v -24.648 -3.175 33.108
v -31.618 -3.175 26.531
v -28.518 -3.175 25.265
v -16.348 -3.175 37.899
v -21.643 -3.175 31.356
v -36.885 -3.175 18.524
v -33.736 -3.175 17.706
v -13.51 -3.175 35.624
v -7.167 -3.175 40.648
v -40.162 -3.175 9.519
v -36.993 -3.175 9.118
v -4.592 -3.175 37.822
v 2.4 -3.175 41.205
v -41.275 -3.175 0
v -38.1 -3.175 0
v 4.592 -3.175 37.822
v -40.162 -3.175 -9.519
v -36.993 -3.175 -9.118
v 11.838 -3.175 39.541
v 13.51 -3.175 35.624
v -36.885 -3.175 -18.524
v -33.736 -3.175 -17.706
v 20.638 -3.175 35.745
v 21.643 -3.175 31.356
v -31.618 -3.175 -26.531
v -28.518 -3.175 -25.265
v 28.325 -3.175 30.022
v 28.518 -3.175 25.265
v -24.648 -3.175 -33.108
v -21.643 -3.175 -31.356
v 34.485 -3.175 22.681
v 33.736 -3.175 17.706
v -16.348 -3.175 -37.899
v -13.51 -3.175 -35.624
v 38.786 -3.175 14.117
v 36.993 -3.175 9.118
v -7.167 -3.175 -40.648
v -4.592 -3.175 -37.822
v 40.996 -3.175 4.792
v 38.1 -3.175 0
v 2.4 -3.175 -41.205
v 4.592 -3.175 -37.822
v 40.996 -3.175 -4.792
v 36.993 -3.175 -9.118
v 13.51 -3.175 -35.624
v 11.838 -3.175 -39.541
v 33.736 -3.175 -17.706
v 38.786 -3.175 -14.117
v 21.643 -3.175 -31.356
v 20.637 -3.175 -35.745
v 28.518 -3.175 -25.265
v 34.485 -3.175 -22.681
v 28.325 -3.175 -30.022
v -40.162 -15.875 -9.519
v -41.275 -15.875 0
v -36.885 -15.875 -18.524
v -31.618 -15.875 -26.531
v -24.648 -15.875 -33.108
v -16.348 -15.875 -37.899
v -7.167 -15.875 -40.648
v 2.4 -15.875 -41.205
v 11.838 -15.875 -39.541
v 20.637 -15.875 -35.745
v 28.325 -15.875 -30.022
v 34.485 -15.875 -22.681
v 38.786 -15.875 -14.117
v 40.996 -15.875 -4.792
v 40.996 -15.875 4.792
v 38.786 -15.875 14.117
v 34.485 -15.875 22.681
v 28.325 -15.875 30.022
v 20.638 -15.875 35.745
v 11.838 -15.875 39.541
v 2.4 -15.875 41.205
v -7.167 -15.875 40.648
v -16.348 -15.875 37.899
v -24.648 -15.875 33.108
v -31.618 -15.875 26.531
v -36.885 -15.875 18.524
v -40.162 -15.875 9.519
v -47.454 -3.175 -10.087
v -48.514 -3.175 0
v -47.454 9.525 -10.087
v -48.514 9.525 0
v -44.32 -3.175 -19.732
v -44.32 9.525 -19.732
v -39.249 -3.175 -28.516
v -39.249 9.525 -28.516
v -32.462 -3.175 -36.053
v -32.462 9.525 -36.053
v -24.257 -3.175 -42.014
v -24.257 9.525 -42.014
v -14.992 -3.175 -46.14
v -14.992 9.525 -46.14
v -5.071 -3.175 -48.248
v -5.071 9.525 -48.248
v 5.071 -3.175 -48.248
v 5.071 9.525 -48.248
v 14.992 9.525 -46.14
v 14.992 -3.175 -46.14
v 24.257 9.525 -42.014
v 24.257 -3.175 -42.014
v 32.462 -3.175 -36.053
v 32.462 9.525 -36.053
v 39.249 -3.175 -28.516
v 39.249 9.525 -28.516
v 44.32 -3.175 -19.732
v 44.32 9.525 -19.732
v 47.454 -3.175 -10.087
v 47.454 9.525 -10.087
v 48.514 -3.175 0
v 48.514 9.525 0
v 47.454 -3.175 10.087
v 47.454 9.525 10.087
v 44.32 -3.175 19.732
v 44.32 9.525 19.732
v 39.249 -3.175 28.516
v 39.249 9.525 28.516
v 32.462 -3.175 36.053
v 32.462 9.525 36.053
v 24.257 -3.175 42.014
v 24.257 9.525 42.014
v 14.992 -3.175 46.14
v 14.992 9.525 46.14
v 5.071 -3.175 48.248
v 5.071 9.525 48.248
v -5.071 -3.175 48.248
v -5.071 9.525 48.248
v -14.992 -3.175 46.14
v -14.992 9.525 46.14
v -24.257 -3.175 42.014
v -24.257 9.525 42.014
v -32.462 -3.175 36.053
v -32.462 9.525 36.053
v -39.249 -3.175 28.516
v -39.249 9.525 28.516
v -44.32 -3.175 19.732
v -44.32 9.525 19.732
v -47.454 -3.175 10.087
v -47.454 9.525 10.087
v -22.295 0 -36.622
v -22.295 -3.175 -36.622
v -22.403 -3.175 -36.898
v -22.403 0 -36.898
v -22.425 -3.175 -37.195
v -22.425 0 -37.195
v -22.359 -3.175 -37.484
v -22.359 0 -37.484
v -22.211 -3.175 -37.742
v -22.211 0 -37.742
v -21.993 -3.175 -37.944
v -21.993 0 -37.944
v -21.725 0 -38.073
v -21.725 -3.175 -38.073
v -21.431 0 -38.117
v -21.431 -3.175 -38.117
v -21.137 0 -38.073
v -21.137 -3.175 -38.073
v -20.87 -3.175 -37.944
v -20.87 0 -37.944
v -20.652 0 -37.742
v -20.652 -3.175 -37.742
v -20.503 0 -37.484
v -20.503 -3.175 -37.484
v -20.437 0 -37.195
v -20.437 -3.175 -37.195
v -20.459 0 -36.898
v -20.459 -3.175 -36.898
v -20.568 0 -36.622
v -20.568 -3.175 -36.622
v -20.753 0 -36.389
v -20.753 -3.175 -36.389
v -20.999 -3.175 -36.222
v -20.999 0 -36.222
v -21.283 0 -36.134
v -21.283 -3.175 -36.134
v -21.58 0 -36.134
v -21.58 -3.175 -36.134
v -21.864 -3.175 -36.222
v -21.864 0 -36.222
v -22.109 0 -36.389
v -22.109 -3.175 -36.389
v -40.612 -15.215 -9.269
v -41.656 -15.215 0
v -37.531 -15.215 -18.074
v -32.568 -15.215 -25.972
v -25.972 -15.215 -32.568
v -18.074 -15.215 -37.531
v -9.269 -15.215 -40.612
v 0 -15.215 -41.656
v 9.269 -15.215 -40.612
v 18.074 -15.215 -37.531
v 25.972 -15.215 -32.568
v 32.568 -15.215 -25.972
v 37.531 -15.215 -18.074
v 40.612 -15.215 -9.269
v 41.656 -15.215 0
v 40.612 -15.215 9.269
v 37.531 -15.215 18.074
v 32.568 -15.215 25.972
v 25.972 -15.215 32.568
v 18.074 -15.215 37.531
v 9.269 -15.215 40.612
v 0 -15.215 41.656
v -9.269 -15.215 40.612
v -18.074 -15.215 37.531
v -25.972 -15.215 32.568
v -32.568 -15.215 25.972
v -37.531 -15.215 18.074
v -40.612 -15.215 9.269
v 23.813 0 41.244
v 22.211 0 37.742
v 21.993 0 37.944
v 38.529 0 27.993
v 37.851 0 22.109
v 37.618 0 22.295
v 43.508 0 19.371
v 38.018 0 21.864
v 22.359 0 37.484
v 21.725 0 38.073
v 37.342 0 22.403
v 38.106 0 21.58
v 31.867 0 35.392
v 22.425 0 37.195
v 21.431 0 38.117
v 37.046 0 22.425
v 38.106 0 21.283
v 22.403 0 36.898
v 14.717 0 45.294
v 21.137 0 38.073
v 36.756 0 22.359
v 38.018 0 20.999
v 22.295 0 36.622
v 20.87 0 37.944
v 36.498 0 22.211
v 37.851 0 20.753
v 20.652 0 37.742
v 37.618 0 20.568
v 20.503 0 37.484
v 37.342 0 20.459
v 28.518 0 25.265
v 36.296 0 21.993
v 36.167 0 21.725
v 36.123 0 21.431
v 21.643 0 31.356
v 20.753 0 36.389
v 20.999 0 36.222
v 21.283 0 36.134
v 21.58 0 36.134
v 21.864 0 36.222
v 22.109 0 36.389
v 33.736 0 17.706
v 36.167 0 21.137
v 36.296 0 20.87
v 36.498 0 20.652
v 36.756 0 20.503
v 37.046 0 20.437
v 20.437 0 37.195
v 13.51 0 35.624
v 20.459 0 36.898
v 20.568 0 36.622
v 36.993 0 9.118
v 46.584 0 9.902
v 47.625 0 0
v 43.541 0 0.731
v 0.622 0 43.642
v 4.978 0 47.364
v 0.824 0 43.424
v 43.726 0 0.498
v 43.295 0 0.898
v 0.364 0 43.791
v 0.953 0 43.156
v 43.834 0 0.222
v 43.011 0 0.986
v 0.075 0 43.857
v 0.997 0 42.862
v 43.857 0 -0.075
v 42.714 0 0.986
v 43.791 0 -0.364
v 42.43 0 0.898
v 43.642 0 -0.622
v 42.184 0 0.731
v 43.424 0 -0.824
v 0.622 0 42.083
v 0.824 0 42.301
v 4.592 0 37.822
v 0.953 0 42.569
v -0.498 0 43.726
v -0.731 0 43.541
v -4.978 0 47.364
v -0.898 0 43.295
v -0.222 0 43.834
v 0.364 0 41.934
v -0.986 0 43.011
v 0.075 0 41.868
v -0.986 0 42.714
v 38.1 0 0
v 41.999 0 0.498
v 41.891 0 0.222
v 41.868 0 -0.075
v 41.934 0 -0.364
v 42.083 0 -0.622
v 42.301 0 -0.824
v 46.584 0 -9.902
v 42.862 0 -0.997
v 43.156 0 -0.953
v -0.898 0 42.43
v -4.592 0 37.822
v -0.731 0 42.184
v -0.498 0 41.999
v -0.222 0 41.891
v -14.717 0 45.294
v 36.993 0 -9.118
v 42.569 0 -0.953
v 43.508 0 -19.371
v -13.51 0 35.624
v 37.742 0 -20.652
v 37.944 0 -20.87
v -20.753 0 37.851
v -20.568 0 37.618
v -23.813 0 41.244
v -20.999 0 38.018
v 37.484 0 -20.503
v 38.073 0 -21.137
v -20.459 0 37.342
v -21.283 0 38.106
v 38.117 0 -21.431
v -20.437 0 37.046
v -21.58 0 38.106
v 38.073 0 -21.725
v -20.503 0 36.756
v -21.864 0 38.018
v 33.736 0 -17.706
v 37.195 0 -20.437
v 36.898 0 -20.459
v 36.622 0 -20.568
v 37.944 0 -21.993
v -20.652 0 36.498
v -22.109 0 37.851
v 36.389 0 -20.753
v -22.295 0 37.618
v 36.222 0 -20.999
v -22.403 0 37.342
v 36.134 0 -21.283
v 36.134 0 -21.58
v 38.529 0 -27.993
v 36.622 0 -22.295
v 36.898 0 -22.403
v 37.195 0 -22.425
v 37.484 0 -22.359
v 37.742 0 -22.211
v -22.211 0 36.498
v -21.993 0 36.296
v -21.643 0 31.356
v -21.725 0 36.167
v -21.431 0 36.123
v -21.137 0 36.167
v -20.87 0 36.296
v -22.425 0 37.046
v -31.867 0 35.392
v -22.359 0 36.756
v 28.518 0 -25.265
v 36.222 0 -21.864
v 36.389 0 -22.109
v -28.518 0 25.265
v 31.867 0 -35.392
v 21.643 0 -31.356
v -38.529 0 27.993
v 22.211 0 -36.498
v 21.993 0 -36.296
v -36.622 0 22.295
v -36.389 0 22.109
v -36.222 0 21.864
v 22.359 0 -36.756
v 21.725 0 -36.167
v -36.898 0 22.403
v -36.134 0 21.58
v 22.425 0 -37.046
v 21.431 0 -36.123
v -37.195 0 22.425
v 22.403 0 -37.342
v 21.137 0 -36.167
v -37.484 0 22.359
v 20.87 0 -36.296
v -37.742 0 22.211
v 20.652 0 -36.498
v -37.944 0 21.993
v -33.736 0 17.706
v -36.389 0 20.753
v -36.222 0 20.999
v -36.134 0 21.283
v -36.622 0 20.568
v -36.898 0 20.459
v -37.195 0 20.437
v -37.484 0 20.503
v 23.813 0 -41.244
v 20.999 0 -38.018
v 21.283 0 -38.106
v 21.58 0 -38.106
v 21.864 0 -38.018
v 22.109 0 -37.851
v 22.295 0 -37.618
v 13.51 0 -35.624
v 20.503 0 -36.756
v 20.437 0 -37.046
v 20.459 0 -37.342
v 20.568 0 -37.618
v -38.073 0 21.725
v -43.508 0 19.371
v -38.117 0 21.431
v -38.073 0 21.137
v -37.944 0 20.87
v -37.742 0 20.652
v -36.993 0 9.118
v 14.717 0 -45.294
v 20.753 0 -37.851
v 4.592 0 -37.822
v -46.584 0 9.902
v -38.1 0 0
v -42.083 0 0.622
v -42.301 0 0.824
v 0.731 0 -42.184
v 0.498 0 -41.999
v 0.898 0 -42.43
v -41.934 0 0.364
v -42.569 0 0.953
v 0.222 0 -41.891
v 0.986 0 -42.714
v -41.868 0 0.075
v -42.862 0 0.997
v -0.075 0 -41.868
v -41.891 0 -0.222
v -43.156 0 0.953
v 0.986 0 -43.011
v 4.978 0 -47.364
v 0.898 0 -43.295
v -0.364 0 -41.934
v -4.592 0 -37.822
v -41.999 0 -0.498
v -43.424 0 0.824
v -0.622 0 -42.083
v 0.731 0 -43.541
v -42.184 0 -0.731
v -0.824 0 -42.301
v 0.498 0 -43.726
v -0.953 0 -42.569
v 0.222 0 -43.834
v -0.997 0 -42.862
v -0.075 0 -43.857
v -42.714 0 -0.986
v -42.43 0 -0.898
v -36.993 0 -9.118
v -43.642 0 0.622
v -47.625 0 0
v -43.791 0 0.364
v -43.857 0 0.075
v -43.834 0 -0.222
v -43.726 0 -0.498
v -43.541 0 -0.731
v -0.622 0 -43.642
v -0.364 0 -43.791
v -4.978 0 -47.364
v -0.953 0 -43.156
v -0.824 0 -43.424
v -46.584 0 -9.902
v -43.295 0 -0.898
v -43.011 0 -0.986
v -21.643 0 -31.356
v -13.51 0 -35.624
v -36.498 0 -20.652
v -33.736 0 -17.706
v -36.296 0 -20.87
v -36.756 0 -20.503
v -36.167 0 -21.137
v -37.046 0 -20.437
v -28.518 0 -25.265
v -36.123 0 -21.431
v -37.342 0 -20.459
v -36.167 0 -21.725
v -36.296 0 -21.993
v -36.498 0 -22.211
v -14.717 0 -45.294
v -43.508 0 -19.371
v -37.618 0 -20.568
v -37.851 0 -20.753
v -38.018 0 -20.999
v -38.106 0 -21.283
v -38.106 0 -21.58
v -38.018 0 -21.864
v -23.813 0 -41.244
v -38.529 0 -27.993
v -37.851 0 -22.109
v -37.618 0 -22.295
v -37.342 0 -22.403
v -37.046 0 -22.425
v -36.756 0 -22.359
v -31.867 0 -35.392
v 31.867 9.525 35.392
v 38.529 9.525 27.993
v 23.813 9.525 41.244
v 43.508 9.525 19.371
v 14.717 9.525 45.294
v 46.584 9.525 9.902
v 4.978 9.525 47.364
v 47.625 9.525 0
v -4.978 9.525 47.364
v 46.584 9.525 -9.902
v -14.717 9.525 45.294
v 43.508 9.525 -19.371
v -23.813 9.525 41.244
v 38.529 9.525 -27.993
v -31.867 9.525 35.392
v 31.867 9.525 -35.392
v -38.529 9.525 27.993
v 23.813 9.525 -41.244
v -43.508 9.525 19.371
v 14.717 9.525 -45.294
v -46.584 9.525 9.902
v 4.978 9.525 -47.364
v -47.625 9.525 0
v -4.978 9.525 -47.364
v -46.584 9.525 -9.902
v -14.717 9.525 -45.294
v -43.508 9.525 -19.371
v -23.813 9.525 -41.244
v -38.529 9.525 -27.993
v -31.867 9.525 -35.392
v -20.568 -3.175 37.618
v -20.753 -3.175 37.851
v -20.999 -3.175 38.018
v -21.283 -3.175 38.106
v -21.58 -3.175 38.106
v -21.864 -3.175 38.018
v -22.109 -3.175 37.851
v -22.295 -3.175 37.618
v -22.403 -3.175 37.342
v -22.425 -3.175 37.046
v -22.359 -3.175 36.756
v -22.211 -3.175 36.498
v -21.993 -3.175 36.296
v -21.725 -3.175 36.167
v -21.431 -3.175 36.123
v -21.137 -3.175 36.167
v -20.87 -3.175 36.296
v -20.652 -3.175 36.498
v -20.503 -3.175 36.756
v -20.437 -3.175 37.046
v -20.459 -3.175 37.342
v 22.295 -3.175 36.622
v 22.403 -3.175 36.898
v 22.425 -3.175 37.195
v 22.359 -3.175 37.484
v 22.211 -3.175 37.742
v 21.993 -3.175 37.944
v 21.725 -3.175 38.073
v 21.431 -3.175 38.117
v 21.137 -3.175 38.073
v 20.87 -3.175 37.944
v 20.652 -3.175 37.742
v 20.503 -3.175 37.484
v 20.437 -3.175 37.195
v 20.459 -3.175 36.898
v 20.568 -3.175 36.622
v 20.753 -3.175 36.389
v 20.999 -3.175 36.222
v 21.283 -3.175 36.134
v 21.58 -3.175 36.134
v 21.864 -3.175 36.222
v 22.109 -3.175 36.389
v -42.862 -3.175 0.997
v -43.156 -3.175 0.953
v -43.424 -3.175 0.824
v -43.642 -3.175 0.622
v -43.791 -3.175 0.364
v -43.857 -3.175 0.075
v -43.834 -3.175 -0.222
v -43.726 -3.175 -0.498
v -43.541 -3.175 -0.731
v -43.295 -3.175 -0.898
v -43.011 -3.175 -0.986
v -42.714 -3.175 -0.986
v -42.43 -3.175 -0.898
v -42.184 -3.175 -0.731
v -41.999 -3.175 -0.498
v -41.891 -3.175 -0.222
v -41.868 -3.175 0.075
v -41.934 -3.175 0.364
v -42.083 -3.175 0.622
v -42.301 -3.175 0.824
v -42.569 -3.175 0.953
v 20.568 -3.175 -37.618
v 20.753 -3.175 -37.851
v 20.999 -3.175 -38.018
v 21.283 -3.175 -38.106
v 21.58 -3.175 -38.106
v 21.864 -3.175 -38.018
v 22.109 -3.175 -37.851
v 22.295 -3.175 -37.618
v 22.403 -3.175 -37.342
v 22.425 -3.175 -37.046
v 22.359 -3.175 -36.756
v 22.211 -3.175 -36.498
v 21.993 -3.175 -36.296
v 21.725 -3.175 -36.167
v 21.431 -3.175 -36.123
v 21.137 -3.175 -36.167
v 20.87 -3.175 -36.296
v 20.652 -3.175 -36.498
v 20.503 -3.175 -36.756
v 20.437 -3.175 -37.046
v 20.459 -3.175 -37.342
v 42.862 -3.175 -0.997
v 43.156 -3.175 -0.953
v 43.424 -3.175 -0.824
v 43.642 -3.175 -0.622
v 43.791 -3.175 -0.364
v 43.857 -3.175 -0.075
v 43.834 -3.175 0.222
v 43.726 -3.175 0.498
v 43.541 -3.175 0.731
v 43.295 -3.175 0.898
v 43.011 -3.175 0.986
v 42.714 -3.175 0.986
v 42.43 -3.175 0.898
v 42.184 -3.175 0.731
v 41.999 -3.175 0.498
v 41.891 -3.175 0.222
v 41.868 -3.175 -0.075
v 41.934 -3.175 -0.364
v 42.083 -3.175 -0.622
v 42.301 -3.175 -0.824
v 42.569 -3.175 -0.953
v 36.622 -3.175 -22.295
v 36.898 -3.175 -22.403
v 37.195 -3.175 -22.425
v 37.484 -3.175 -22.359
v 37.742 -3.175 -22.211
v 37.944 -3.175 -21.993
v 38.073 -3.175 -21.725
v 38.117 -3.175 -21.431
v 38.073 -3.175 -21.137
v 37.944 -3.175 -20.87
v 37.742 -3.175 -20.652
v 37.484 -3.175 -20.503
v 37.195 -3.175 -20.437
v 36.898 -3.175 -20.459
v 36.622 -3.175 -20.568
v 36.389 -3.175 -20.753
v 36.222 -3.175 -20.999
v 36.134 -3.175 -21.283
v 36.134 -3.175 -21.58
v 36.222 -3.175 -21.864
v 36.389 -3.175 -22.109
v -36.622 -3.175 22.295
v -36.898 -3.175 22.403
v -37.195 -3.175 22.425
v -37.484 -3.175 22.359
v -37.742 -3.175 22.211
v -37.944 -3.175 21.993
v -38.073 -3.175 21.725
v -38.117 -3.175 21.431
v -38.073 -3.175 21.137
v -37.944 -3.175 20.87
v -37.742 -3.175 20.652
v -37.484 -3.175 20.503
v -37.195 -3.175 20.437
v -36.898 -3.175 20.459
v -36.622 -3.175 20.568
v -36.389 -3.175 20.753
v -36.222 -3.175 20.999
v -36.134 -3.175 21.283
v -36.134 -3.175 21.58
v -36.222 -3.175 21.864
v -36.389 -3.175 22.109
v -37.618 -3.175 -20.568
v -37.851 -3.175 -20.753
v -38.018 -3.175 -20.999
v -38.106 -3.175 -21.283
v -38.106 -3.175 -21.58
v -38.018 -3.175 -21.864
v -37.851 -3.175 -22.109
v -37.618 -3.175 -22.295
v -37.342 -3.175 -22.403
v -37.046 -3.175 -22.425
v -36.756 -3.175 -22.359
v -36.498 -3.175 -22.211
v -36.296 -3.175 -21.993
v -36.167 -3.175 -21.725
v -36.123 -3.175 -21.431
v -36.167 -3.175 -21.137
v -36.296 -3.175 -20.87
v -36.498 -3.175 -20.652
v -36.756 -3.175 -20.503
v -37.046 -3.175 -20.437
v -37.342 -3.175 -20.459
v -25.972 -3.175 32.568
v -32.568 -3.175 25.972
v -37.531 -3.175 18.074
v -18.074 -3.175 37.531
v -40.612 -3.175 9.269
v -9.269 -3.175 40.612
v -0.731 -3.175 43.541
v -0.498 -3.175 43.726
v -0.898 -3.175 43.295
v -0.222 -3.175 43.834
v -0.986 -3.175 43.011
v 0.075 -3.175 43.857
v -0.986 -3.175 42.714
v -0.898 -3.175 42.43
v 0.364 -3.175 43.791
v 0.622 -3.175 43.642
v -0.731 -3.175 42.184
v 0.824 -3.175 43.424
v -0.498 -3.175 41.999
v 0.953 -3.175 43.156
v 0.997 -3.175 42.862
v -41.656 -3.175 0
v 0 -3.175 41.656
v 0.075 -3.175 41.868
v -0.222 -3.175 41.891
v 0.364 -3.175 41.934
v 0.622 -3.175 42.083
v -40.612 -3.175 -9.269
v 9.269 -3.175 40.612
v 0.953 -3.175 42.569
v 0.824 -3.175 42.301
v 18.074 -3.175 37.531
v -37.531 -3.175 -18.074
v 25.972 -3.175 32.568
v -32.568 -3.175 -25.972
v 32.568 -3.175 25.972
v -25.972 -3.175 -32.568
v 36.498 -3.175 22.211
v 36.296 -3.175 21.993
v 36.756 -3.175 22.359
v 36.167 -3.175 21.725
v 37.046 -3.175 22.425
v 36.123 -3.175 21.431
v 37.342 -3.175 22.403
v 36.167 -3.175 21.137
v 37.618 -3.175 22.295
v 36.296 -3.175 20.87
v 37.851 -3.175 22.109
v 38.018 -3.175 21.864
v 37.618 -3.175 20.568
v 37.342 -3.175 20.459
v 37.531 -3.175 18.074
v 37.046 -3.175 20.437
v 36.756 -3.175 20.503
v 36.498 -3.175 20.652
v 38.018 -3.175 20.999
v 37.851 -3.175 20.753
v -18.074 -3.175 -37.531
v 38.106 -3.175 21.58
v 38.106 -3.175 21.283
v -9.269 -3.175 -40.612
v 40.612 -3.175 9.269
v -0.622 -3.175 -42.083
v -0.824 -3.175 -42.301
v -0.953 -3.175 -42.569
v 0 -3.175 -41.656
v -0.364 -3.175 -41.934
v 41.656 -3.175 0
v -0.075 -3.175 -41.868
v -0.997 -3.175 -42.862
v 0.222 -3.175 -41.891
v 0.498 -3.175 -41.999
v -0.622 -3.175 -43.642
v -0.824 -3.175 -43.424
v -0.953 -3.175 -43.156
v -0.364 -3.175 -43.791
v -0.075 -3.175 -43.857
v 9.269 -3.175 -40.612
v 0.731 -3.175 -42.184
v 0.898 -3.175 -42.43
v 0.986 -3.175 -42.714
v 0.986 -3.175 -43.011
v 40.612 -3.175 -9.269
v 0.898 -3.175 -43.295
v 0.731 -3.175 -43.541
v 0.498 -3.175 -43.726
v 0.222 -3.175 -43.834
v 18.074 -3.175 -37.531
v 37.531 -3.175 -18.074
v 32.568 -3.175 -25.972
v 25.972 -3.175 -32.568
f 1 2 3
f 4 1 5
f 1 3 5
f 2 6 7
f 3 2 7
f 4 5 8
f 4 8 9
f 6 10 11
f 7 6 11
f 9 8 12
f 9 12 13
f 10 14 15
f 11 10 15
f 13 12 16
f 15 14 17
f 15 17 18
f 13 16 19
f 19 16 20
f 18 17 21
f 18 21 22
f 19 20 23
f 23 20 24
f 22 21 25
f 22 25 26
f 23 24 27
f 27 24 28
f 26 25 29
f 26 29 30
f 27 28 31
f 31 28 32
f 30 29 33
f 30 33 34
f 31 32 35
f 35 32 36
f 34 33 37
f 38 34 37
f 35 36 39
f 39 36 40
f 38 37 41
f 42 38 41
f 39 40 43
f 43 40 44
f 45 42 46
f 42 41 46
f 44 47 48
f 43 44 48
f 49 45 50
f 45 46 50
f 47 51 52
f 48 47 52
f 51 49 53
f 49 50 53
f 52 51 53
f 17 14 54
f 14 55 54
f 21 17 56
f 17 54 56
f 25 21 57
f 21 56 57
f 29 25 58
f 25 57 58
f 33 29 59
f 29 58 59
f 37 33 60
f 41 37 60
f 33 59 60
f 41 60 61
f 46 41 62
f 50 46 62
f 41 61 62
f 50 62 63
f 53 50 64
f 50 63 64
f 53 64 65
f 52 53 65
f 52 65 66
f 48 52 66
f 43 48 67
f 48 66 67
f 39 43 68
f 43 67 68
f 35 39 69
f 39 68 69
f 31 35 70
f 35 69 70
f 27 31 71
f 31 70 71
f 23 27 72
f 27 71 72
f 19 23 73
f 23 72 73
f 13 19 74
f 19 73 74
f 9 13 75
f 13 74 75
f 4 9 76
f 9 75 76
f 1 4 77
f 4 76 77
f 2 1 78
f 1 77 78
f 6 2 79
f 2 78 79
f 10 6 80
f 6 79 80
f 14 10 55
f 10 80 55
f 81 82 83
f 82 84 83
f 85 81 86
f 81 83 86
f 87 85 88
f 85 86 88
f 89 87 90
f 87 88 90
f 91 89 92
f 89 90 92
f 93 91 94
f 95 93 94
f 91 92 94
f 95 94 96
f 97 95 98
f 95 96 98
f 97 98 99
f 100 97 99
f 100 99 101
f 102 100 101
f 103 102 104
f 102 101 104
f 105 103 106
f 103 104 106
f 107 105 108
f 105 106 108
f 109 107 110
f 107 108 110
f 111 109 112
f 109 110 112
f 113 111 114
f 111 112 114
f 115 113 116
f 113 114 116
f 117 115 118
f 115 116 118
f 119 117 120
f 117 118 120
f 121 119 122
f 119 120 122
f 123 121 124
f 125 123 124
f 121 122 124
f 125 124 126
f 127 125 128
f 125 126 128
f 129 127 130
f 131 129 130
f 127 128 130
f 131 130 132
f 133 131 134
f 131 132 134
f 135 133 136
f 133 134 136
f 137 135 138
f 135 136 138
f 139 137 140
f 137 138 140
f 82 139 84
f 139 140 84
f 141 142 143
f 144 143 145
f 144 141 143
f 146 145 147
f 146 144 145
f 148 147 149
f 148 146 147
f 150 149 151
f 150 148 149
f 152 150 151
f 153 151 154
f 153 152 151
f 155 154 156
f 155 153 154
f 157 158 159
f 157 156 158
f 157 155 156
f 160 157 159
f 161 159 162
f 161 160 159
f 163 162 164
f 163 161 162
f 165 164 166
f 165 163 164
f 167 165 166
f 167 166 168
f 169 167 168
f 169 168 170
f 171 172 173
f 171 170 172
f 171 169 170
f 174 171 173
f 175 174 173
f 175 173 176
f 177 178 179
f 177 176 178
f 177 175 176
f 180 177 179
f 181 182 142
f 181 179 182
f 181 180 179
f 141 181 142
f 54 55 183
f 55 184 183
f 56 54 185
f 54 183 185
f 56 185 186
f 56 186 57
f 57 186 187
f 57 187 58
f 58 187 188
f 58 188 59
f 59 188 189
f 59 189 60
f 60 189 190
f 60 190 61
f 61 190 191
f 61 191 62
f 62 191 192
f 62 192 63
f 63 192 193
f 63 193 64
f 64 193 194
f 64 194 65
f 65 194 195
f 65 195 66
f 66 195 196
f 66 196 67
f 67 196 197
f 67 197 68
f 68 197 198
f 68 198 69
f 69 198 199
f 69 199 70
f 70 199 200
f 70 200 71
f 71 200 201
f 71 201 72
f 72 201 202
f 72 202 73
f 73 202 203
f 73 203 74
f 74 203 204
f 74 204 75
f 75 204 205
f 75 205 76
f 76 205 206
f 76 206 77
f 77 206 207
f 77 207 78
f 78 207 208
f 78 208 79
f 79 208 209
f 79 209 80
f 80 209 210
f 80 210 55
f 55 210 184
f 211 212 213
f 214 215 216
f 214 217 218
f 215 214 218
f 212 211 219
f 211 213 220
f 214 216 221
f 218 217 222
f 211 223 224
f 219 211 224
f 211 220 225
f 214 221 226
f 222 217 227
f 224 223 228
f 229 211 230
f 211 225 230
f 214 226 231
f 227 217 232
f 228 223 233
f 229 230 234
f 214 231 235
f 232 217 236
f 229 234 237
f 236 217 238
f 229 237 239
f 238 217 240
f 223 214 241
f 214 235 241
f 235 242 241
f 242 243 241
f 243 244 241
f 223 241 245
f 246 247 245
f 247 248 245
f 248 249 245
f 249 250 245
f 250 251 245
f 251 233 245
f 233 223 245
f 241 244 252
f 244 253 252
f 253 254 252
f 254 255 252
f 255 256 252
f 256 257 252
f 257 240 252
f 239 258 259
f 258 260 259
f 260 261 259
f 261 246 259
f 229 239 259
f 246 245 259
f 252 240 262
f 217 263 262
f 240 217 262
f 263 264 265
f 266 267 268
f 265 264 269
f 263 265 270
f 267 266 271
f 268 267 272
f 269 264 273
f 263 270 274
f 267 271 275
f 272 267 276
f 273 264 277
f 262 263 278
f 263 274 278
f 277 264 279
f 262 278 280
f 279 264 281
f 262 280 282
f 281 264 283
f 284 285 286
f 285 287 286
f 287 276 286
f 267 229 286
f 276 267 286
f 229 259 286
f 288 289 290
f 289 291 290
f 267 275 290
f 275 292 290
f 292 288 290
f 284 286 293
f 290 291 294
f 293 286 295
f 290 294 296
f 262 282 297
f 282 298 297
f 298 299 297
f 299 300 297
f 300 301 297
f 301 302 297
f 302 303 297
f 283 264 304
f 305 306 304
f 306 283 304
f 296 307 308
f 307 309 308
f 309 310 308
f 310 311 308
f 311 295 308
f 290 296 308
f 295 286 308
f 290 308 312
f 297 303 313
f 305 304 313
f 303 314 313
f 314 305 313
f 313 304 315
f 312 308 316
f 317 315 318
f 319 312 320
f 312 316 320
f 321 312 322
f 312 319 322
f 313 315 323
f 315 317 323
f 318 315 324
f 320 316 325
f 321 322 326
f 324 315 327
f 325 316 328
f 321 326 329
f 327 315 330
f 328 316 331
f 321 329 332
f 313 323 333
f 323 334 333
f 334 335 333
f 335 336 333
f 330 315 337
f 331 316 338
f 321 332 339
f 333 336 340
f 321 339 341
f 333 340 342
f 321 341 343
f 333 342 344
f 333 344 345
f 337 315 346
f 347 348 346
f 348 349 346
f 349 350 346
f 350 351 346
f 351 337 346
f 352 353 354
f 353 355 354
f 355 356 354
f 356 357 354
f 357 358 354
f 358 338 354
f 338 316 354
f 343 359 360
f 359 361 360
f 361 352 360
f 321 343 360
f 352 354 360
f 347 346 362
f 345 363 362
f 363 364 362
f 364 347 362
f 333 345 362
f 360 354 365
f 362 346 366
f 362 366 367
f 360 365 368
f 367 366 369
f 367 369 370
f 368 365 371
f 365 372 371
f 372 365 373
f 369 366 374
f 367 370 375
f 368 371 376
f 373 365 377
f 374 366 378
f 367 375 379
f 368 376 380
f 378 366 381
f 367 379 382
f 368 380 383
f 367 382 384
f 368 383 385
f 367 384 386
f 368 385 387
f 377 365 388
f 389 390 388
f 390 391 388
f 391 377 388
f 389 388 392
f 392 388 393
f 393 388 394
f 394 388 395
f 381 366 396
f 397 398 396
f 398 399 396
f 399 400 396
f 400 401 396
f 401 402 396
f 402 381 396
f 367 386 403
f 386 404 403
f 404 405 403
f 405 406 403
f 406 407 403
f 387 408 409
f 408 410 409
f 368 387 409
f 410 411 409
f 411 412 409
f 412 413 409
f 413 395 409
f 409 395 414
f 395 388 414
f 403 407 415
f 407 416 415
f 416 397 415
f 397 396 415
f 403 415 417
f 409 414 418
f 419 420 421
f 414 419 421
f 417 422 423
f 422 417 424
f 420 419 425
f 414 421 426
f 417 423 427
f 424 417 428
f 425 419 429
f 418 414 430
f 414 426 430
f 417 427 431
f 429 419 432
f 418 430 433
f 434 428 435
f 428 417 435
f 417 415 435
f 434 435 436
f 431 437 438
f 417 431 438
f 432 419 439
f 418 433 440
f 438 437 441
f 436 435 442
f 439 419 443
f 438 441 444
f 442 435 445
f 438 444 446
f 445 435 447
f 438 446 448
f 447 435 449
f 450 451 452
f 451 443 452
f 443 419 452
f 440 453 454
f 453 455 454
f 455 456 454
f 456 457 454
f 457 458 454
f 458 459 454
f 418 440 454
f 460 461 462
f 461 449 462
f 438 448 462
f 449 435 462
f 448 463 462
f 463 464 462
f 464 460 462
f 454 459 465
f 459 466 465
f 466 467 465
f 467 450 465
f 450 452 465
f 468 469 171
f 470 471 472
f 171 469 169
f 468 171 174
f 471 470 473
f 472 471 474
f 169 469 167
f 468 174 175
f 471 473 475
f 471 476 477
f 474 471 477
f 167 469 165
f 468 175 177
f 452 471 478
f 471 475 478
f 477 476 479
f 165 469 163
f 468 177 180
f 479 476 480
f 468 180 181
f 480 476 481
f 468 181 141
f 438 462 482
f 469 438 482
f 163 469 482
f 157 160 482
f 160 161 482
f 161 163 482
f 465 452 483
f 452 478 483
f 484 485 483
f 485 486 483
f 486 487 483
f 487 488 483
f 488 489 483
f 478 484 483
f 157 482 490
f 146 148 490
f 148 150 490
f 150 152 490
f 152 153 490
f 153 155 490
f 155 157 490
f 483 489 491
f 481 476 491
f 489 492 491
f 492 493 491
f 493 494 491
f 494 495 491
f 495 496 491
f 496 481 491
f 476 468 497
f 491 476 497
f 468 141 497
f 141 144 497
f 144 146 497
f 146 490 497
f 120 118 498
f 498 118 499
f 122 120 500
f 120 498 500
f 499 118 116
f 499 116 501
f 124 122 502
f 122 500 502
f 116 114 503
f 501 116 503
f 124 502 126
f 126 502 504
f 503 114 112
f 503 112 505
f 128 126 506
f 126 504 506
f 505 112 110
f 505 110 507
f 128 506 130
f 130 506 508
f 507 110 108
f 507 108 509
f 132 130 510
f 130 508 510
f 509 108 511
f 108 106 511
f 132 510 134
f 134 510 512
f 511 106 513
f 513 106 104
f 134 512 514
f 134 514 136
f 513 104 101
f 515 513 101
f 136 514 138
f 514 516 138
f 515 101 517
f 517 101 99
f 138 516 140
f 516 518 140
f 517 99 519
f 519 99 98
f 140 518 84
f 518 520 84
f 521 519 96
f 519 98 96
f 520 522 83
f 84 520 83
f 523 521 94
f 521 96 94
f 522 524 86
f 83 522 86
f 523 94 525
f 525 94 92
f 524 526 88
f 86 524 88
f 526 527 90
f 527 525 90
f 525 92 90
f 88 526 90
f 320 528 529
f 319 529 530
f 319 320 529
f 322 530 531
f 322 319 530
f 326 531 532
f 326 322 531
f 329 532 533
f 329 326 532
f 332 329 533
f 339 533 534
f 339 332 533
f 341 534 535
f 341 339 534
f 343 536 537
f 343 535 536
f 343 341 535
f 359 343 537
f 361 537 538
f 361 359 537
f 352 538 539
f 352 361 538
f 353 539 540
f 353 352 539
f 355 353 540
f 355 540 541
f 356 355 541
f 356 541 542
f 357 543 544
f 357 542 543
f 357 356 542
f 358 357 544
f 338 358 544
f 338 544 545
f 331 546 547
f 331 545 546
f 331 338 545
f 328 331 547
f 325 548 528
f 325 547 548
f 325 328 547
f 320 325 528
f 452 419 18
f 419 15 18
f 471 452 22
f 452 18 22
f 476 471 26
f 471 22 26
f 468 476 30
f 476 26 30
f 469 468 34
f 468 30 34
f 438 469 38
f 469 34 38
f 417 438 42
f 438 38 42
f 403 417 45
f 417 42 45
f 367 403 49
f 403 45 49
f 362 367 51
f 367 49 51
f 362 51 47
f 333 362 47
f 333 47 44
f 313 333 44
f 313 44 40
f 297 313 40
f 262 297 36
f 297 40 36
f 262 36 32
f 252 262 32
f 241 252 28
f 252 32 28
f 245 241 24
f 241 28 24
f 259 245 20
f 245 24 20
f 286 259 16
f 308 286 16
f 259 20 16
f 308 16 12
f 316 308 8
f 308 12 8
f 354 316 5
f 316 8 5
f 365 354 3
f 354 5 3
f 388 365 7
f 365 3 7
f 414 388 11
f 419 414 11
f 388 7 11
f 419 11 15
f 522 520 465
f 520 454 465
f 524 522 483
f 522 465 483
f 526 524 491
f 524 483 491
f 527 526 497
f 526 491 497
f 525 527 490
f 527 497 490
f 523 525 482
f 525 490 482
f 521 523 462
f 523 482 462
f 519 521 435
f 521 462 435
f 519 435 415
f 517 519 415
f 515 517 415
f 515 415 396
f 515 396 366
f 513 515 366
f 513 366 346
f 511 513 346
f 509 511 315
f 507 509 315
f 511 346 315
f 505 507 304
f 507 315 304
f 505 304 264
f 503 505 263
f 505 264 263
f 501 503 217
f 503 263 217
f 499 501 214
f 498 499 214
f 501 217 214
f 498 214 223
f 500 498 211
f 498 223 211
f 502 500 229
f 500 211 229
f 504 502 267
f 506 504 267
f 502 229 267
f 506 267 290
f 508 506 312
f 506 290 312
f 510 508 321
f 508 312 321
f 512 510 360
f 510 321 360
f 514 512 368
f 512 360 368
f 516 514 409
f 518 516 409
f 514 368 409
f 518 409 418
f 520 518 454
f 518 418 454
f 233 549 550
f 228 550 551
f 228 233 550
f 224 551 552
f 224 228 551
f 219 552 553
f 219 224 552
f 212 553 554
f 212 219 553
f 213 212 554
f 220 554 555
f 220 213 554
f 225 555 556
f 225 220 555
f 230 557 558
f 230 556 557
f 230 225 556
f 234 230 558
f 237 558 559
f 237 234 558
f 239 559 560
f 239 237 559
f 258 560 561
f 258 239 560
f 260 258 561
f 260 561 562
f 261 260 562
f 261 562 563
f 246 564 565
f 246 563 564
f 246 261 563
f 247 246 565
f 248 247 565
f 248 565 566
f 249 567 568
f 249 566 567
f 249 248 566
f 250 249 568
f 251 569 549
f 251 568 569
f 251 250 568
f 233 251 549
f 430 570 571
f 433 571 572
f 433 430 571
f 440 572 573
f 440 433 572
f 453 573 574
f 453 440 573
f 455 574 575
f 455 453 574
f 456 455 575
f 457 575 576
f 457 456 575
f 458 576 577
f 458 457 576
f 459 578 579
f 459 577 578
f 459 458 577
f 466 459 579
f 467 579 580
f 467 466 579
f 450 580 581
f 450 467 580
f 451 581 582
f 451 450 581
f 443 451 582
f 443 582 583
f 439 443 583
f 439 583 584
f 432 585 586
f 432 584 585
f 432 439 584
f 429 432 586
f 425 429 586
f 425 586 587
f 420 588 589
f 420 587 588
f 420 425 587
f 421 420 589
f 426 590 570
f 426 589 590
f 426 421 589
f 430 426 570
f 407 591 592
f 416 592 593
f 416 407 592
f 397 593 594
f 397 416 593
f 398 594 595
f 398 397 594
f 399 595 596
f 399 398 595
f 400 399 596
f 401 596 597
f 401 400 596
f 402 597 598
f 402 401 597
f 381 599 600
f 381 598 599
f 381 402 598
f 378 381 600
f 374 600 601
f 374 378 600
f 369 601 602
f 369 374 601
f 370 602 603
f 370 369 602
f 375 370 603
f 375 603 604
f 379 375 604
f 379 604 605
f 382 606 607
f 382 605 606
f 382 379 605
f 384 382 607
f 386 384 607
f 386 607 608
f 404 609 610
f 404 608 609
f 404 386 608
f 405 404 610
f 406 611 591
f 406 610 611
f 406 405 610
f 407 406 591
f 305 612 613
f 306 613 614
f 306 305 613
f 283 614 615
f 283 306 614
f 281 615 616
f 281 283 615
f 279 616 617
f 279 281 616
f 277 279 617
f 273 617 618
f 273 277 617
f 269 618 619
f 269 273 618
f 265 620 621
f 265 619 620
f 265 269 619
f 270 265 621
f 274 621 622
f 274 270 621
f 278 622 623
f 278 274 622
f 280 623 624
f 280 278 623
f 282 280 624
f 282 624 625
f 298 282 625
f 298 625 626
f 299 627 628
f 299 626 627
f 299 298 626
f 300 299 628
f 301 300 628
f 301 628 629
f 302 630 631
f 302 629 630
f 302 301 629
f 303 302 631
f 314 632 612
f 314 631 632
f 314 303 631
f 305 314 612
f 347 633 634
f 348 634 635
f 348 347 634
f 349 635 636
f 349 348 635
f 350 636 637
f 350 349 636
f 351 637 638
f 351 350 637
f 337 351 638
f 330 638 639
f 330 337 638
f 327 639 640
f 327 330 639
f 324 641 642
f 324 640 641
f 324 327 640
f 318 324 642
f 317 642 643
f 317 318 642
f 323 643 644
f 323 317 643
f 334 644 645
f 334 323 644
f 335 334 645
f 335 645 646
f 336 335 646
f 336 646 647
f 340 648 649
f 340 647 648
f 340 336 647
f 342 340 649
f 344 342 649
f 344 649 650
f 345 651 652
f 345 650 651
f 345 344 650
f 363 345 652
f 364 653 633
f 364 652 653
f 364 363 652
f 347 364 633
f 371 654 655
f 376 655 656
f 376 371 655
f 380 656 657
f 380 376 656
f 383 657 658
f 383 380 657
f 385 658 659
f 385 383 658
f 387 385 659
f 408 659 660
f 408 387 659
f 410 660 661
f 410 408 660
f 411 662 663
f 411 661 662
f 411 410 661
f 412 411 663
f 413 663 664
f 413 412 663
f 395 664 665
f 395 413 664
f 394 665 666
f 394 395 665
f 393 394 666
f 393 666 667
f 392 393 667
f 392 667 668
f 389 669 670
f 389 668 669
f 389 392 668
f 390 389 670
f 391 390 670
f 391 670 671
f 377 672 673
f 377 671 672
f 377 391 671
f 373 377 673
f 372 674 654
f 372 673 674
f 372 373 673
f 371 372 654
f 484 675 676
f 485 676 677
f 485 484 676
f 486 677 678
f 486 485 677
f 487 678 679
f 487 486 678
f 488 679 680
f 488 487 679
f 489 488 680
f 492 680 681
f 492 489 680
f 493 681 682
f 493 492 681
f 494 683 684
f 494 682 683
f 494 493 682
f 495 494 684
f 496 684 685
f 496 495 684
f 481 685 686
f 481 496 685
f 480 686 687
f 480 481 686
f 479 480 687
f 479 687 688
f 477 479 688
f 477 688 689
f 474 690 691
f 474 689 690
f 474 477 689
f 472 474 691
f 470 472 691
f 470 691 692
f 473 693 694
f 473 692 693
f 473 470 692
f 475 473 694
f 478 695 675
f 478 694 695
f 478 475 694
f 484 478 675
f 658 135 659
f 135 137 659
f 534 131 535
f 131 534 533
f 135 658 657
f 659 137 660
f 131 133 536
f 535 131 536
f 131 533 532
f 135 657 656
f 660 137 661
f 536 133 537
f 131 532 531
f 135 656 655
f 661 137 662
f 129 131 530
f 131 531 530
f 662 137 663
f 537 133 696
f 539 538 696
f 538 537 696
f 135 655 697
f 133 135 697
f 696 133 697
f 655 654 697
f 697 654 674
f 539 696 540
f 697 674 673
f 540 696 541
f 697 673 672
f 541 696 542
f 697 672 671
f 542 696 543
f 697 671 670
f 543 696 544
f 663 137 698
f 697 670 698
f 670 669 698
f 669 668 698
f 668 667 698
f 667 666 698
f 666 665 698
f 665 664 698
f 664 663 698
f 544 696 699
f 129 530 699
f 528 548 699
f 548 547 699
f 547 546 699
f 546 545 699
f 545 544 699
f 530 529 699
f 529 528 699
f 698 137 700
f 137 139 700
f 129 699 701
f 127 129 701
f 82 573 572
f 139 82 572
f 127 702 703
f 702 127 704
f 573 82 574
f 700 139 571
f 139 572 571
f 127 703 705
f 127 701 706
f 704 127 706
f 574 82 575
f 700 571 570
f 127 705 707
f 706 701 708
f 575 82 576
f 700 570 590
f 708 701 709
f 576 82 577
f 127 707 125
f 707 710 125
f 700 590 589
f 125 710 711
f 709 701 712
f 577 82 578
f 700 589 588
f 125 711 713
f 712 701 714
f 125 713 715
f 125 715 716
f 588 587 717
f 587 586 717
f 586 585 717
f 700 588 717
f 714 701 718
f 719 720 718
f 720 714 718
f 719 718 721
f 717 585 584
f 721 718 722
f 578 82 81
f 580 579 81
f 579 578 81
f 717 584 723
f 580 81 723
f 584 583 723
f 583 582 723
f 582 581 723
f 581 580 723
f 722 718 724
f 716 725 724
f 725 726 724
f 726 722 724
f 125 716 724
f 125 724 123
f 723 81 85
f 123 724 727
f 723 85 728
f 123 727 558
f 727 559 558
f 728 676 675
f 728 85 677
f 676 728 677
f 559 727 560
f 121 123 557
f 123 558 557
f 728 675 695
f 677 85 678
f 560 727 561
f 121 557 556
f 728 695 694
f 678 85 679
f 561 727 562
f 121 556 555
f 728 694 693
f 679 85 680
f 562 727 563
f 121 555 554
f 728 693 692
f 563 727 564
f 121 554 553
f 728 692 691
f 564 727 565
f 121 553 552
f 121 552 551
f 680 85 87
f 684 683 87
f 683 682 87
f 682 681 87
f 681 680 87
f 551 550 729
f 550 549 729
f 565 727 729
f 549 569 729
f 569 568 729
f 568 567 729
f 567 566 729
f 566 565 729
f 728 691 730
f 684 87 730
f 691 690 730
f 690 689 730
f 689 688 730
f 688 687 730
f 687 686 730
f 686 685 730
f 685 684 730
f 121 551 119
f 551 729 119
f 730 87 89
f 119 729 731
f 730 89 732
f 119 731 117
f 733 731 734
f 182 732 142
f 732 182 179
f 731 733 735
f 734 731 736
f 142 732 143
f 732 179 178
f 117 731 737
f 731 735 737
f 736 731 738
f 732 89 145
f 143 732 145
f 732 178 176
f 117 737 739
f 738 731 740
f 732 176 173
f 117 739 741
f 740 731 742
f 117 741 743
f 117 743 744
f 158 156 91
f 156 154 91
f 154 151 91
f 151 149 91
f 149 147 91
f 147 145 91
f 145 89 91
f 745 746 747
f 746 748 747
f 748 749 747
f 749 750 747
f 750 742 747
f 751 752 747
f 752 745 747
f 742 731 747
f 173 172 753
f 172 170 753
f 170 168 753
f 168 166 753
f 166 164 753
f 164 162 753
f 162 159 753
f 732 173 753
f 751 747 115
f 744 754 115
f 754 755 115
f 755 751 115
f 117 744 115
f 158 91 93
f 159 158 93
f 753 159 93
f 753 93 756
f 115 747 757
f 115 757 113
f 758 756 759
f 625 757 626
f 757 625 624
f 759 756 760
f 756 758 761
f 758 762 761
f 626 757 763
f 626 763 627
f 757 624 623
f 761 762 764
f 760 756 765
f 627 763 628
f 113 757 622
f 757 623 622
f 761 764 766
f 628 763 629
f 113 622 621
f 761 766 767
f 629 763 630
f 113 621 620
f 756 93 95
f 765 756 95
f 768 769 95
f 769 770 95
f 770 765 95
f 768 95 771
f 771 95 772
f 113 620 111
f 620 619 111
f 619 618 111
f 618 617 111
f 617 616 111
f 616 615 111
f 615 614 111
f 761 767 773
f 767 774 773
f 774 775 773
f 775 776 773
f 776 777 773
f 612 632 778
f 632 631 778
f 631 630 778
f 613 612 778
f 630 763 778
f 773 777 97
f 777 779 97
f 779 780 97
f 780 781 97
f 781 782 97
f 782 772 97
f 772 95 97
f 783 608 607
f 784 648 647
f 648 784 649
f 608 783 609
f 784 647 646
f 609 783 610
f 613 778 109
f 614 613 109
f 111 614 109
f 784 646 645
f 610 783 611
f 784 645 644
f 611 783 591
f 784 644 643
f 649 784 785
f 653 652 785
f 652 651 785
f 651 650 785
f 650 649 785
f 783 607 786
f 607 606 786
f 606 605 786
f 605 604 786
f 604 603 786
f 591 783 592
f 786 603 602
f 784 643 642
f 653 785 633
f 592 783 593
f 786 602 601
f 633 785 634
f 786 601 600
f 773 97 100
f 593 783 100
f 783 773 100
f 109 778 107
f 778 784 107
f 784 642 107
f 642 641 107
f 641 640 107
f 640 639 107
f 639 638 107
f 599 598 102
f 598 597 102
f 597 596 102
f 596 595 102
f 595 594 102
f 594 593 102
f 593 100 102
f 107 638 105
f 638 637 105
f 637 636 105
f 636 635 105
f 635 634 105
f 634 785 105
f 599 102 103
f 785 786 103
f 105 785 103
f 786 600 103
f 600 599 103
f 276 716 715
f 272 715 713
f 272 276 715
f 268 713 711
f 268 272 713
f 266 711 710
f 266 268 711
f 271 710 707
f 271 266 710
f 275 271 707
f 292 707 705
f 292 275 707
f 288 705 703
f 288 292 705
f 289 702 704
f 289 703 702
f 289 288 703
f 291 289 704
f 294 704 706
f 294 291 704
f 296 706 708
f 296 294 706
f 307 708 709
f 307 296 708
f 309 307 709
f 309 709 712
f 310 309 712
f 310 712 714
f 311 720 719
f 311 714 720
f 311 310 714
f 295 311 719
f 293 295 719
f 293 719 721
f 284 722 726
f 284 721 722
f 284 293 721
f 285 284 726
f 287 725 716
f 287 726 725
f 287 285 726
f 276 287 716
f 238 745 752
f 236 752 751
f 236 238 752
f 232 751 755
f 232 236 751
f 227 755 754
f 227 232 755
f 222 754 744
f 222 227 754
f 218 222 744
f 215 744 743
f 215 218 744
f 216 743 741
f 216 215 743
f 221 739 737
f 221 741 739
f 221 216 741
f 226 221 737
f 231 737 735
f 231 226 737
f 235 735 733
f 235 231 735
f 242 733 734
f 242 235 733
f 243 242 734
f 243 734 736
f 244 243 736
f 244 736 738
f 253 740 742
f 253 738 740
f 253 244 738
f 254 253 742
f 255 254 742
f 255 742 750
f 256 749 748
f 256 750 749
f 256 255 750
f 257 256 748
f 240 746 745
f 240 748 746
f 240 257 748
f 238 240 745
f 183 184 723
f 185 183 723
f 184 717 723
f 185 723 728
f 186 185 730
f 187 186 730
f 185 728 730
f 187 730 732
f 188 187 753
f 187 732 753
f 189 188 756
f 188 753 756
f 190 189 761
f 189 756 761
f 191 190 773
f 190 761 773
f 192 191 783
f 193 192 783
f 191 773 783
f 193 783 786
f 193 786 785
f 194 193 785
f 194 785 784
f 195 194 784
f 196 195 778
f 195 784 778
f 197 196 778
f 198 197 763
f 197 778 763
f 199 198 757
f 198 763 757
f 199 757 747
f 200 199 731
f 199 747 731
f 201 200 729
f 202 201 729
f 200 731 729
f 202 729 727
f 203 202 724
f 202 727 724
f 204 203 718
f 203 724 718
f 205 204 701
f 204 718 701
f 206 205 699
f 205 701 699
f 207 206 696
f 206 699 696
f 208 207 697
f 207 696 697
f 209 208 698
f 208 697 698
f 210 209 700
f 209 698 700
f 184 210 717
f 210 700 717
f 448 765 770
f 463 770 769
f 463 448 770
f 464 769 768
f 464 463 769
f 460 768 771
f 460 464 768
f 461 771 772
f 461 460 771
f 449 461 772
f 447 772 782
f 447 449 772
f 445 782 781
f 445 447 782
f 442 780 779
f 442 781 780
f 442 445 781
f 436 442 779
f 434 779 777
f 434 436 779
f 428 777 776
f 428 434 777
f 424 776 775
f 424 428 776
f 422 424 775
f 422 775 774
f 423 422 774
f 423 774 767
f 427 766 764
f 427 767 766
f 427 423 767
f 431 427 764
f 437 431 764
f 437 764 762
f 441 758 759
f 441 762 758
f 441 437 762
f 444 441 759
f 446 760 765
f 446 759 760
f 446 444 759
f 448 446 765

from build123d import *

# Parameters (mm, degrees)
SCREW_HOLES_COUNT = 12


with BuildPart() as part:
    # Cross Section → Main (revolve)
    with BuildSketch(Plane.XY):
        Polygon((-38.1, 0), (-38.1, -3.175), (-41.275, -3.175), (-41.275, -15.875), (-41.656, -15.215088642), (-41.656, -3.175), (-48.514, -3.175), (-48.514, 9.525), (-47.625, 9.525), (-47.625, 0), align=None)
    revolve(axis=Axis((0, 55, 0), (0, -1, 0)))

    # Sketch7 → #3-48 Tapped Hole1 (revolve, cut)
    with BuildSketch(Plane(origin=(-42.8625, 0, 0), x_dir=(0, 0, 1), z_dir=(1, 0, 0))):
        Polygon((0, 0), (0, 3.901027994), (0.99695, 3.302), (0.99695, 0), align=None)
    f_3_48_tapped_hole1 = revolve(axis=Axis((-42.8625, 6.35, 0), (0, -1, 0)), mode=Mode.SUBTRACT)

    # Screw Holes: #3-48 Tapped Hole1 ×12 about axis
    screw_holes_axis = Axis((0, 0, 0), (0, 1, 0))
    for i in range(1, SCREW_HOLES_COUNT):
        add(f_3_48_tapped_hole1.rotate(screw_holes_axis, i * 360 / SCREW_HOLES_COUNT), mode=Mode.SUBTRACT)


solid = part.part
